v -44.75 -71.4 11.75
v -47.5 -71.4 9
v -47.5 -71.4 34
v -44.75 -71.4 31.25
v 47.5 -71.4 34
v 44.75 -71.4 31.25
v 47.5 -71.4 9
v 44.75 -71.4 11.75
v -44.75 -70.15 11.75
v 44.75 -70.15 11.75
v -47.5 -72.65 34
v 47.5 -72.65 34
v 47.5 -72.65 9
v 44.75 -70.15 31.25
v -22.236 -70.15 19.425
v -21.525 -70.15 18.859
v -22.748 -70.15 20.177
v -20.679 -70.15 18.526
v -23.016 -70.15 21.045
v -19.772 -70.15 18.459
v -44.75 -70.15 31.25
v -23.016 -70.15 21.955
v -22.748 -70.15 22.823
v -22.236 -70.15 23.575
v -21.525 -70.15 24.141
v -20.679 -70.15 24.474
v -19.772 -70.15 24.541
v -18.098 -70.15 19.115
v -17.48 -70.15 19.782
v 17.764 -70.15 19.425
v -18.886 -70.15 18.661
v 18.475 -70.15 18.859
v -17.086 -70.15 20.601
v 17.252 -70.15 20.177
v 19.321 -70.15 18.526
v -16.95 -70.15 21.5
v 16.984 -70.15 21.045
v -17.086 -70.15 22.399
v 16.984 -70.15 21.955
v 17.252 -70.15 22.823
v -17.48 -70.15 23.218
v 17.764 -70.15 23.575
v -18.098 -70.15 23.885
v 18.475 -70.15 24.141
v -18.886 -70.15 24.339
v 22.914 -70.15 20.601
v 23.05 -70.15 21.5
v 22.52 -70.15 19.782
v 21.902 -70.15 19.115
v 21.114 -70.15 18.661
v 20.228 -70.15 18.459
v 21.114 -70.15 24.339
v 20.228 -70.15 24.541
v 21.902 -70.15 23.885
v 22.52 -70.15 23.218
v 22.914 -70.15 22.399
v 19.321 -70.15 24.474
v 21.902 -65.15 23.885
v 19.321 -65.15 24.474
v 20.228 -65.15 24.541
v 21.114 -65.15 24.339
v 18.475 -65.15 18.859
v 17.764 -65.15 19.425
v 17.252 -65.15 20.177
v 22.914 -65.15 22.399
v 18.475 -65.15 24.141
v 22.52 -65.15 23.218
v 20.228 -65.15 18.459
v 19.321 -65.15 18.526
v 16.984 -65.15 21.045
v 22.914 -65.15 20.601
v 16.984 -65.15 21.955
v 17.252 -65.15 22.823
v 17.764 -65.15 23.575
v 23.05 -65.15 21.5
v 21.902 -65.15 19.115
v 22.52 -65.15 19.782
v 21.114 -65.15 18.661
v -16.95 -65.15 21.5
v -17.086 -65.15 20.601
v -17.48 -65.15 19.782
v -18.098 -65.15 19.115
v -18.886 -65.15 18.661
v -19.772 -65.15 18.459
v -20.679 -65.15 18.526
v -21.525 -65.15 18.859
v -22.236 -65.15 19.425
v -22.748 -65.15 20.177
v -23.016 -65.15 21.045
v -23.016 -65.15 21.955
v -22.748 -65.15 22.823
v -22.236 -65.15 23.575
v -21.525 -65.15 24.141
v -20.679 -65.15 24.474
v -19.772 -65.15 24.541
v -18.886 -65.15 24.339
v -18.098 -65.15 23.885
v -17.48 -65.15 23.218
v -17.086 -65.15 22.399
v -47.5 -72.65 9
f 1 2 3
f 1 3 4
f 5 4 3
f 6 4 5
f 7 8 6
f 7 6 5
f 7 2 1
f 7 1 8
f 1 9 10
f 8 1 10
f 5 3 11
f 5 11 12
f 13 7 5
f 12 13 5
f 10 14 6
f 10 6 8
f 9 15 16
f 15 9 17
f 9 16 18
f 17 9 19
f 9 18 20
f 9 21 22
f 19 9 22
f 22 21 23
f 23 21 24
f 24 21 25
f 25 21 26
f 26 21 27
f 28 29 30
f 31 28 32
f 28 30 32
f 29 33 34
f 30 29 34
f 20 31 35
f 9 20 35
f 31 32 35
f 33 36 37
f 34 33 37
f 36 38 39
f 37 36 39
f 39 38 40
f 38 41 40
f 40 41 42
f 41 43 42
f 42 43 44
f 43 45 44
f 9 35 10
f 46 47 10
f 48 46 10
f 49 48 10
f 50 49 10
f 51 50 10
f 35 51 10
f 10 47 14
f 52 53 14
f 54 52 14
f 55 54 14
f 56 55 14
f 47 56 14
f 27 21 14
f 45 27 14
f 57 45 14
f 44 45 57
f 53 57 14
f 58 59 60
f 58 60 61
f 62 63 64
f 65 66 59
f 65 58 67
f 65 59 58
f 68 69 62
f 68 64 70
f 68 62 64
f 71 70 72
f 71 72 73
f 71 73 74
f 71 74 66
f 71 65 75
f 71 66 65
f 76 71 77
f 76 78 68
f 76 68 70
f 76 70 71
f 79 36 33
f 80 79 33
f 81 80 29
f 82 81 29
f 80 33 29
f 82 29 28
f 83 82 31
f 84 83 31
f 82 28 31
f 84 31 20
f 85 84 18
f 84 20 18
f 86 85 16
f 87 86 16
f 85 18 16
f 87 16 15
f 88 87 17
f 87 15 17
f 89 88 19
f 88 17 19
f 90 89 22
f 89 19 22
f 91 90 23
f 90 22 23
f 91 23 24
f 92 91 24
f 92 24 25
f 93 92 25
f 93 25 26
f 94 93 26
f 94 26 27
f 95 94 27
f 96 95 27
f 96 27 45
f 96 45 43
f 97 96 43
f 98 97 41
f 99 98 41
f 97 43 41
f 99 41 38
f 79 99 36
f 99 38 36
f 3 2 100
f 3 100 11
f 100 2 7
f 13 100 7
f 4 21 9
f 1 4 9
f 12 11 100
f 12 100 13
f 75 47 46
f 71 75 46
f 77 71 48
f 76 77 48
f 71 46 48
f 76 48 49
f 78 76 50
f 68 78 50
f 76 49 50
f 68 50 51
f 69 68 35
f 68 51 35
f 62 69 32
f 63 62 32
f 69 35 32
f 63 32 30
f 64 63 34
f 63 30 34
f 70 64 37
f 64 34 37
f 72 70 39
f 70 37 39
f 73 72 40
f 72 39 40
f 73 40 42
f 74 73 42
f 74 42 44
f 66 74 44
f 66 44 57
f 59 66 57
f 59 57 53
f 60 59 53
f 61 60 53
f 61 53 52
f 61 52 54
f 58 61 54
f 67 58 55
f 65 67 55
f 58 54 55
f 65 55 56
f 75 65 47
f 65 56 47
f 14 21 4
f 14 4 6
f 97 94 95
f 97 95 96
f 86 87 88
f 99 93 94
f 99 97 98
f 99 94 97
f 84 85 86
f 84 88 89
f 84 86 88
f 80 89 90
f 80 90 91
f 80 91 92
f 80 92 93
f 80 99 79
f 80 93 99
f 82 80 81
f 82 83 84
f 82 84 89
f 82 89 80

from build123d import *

# Parameters (mm, degrees)
SKETCH048_W     = 95
SKETCH048_H     = 25
PAD020_DEPTH    = 2.5
SKETCH049_R     = 3.05
PAD021_DEPTH    = 5
SKETCH050_W     = 95
SKETCH050_H     = 25
SKETCH050_W_2   = 89.5
SKETCH050_H_2   = 19.5
POCKET027_DEPTH = 1.25


with BuildPart() as part:
    # Sketch048 → Pad020 (new body)
    with BuildSketch(Plane.XZ):
        with Locations((0, 21.5)):
            Rectangle(SKETCH048_W, SKETCH048_H)
    extrude(amount=PAD020_DEPTH)

    # Sketch049 (on Face5 of Pad020) → Pad021 (join)
    with BuildSketch(Plane(origin=(0, 0, 0), x_dir=(1, 0, 0), z_dir=(0, 1, 0))):
        with Locations((-20, -21.5)):
            Circle(SKETCH049_R)
        with Locations((20, -21.5)):
            Circle(SKETCH049_R)
    extrude(amount=PAD021_DEPTH)

    # Sketch050 (on Face4 of Pad021) → Pocket027 (cut)
    with BuildSketch(Plane(origin=(0, 0, 0), x_dir=(1, 0, 0), z_dir=(0, 1, 0))):
        with Locations((0, -21.5)):
            Rectangle(SKETCH050_W, SKETCH050_H)
        with Locations((0, -21.5)):
            Rectangle(SKETCH050_W_2, SKETCH050_H_2, mode=Mode.SUBTRACT)
    extrude(amount=-POCKET027_DEPTH, mode=Mode.SUBTRACT)


with BuildPart() as part_1:
    # Body010 placement: moved
    add(part.part.moved(Location((0, -70.15, 0))))


solid = part_1.part
